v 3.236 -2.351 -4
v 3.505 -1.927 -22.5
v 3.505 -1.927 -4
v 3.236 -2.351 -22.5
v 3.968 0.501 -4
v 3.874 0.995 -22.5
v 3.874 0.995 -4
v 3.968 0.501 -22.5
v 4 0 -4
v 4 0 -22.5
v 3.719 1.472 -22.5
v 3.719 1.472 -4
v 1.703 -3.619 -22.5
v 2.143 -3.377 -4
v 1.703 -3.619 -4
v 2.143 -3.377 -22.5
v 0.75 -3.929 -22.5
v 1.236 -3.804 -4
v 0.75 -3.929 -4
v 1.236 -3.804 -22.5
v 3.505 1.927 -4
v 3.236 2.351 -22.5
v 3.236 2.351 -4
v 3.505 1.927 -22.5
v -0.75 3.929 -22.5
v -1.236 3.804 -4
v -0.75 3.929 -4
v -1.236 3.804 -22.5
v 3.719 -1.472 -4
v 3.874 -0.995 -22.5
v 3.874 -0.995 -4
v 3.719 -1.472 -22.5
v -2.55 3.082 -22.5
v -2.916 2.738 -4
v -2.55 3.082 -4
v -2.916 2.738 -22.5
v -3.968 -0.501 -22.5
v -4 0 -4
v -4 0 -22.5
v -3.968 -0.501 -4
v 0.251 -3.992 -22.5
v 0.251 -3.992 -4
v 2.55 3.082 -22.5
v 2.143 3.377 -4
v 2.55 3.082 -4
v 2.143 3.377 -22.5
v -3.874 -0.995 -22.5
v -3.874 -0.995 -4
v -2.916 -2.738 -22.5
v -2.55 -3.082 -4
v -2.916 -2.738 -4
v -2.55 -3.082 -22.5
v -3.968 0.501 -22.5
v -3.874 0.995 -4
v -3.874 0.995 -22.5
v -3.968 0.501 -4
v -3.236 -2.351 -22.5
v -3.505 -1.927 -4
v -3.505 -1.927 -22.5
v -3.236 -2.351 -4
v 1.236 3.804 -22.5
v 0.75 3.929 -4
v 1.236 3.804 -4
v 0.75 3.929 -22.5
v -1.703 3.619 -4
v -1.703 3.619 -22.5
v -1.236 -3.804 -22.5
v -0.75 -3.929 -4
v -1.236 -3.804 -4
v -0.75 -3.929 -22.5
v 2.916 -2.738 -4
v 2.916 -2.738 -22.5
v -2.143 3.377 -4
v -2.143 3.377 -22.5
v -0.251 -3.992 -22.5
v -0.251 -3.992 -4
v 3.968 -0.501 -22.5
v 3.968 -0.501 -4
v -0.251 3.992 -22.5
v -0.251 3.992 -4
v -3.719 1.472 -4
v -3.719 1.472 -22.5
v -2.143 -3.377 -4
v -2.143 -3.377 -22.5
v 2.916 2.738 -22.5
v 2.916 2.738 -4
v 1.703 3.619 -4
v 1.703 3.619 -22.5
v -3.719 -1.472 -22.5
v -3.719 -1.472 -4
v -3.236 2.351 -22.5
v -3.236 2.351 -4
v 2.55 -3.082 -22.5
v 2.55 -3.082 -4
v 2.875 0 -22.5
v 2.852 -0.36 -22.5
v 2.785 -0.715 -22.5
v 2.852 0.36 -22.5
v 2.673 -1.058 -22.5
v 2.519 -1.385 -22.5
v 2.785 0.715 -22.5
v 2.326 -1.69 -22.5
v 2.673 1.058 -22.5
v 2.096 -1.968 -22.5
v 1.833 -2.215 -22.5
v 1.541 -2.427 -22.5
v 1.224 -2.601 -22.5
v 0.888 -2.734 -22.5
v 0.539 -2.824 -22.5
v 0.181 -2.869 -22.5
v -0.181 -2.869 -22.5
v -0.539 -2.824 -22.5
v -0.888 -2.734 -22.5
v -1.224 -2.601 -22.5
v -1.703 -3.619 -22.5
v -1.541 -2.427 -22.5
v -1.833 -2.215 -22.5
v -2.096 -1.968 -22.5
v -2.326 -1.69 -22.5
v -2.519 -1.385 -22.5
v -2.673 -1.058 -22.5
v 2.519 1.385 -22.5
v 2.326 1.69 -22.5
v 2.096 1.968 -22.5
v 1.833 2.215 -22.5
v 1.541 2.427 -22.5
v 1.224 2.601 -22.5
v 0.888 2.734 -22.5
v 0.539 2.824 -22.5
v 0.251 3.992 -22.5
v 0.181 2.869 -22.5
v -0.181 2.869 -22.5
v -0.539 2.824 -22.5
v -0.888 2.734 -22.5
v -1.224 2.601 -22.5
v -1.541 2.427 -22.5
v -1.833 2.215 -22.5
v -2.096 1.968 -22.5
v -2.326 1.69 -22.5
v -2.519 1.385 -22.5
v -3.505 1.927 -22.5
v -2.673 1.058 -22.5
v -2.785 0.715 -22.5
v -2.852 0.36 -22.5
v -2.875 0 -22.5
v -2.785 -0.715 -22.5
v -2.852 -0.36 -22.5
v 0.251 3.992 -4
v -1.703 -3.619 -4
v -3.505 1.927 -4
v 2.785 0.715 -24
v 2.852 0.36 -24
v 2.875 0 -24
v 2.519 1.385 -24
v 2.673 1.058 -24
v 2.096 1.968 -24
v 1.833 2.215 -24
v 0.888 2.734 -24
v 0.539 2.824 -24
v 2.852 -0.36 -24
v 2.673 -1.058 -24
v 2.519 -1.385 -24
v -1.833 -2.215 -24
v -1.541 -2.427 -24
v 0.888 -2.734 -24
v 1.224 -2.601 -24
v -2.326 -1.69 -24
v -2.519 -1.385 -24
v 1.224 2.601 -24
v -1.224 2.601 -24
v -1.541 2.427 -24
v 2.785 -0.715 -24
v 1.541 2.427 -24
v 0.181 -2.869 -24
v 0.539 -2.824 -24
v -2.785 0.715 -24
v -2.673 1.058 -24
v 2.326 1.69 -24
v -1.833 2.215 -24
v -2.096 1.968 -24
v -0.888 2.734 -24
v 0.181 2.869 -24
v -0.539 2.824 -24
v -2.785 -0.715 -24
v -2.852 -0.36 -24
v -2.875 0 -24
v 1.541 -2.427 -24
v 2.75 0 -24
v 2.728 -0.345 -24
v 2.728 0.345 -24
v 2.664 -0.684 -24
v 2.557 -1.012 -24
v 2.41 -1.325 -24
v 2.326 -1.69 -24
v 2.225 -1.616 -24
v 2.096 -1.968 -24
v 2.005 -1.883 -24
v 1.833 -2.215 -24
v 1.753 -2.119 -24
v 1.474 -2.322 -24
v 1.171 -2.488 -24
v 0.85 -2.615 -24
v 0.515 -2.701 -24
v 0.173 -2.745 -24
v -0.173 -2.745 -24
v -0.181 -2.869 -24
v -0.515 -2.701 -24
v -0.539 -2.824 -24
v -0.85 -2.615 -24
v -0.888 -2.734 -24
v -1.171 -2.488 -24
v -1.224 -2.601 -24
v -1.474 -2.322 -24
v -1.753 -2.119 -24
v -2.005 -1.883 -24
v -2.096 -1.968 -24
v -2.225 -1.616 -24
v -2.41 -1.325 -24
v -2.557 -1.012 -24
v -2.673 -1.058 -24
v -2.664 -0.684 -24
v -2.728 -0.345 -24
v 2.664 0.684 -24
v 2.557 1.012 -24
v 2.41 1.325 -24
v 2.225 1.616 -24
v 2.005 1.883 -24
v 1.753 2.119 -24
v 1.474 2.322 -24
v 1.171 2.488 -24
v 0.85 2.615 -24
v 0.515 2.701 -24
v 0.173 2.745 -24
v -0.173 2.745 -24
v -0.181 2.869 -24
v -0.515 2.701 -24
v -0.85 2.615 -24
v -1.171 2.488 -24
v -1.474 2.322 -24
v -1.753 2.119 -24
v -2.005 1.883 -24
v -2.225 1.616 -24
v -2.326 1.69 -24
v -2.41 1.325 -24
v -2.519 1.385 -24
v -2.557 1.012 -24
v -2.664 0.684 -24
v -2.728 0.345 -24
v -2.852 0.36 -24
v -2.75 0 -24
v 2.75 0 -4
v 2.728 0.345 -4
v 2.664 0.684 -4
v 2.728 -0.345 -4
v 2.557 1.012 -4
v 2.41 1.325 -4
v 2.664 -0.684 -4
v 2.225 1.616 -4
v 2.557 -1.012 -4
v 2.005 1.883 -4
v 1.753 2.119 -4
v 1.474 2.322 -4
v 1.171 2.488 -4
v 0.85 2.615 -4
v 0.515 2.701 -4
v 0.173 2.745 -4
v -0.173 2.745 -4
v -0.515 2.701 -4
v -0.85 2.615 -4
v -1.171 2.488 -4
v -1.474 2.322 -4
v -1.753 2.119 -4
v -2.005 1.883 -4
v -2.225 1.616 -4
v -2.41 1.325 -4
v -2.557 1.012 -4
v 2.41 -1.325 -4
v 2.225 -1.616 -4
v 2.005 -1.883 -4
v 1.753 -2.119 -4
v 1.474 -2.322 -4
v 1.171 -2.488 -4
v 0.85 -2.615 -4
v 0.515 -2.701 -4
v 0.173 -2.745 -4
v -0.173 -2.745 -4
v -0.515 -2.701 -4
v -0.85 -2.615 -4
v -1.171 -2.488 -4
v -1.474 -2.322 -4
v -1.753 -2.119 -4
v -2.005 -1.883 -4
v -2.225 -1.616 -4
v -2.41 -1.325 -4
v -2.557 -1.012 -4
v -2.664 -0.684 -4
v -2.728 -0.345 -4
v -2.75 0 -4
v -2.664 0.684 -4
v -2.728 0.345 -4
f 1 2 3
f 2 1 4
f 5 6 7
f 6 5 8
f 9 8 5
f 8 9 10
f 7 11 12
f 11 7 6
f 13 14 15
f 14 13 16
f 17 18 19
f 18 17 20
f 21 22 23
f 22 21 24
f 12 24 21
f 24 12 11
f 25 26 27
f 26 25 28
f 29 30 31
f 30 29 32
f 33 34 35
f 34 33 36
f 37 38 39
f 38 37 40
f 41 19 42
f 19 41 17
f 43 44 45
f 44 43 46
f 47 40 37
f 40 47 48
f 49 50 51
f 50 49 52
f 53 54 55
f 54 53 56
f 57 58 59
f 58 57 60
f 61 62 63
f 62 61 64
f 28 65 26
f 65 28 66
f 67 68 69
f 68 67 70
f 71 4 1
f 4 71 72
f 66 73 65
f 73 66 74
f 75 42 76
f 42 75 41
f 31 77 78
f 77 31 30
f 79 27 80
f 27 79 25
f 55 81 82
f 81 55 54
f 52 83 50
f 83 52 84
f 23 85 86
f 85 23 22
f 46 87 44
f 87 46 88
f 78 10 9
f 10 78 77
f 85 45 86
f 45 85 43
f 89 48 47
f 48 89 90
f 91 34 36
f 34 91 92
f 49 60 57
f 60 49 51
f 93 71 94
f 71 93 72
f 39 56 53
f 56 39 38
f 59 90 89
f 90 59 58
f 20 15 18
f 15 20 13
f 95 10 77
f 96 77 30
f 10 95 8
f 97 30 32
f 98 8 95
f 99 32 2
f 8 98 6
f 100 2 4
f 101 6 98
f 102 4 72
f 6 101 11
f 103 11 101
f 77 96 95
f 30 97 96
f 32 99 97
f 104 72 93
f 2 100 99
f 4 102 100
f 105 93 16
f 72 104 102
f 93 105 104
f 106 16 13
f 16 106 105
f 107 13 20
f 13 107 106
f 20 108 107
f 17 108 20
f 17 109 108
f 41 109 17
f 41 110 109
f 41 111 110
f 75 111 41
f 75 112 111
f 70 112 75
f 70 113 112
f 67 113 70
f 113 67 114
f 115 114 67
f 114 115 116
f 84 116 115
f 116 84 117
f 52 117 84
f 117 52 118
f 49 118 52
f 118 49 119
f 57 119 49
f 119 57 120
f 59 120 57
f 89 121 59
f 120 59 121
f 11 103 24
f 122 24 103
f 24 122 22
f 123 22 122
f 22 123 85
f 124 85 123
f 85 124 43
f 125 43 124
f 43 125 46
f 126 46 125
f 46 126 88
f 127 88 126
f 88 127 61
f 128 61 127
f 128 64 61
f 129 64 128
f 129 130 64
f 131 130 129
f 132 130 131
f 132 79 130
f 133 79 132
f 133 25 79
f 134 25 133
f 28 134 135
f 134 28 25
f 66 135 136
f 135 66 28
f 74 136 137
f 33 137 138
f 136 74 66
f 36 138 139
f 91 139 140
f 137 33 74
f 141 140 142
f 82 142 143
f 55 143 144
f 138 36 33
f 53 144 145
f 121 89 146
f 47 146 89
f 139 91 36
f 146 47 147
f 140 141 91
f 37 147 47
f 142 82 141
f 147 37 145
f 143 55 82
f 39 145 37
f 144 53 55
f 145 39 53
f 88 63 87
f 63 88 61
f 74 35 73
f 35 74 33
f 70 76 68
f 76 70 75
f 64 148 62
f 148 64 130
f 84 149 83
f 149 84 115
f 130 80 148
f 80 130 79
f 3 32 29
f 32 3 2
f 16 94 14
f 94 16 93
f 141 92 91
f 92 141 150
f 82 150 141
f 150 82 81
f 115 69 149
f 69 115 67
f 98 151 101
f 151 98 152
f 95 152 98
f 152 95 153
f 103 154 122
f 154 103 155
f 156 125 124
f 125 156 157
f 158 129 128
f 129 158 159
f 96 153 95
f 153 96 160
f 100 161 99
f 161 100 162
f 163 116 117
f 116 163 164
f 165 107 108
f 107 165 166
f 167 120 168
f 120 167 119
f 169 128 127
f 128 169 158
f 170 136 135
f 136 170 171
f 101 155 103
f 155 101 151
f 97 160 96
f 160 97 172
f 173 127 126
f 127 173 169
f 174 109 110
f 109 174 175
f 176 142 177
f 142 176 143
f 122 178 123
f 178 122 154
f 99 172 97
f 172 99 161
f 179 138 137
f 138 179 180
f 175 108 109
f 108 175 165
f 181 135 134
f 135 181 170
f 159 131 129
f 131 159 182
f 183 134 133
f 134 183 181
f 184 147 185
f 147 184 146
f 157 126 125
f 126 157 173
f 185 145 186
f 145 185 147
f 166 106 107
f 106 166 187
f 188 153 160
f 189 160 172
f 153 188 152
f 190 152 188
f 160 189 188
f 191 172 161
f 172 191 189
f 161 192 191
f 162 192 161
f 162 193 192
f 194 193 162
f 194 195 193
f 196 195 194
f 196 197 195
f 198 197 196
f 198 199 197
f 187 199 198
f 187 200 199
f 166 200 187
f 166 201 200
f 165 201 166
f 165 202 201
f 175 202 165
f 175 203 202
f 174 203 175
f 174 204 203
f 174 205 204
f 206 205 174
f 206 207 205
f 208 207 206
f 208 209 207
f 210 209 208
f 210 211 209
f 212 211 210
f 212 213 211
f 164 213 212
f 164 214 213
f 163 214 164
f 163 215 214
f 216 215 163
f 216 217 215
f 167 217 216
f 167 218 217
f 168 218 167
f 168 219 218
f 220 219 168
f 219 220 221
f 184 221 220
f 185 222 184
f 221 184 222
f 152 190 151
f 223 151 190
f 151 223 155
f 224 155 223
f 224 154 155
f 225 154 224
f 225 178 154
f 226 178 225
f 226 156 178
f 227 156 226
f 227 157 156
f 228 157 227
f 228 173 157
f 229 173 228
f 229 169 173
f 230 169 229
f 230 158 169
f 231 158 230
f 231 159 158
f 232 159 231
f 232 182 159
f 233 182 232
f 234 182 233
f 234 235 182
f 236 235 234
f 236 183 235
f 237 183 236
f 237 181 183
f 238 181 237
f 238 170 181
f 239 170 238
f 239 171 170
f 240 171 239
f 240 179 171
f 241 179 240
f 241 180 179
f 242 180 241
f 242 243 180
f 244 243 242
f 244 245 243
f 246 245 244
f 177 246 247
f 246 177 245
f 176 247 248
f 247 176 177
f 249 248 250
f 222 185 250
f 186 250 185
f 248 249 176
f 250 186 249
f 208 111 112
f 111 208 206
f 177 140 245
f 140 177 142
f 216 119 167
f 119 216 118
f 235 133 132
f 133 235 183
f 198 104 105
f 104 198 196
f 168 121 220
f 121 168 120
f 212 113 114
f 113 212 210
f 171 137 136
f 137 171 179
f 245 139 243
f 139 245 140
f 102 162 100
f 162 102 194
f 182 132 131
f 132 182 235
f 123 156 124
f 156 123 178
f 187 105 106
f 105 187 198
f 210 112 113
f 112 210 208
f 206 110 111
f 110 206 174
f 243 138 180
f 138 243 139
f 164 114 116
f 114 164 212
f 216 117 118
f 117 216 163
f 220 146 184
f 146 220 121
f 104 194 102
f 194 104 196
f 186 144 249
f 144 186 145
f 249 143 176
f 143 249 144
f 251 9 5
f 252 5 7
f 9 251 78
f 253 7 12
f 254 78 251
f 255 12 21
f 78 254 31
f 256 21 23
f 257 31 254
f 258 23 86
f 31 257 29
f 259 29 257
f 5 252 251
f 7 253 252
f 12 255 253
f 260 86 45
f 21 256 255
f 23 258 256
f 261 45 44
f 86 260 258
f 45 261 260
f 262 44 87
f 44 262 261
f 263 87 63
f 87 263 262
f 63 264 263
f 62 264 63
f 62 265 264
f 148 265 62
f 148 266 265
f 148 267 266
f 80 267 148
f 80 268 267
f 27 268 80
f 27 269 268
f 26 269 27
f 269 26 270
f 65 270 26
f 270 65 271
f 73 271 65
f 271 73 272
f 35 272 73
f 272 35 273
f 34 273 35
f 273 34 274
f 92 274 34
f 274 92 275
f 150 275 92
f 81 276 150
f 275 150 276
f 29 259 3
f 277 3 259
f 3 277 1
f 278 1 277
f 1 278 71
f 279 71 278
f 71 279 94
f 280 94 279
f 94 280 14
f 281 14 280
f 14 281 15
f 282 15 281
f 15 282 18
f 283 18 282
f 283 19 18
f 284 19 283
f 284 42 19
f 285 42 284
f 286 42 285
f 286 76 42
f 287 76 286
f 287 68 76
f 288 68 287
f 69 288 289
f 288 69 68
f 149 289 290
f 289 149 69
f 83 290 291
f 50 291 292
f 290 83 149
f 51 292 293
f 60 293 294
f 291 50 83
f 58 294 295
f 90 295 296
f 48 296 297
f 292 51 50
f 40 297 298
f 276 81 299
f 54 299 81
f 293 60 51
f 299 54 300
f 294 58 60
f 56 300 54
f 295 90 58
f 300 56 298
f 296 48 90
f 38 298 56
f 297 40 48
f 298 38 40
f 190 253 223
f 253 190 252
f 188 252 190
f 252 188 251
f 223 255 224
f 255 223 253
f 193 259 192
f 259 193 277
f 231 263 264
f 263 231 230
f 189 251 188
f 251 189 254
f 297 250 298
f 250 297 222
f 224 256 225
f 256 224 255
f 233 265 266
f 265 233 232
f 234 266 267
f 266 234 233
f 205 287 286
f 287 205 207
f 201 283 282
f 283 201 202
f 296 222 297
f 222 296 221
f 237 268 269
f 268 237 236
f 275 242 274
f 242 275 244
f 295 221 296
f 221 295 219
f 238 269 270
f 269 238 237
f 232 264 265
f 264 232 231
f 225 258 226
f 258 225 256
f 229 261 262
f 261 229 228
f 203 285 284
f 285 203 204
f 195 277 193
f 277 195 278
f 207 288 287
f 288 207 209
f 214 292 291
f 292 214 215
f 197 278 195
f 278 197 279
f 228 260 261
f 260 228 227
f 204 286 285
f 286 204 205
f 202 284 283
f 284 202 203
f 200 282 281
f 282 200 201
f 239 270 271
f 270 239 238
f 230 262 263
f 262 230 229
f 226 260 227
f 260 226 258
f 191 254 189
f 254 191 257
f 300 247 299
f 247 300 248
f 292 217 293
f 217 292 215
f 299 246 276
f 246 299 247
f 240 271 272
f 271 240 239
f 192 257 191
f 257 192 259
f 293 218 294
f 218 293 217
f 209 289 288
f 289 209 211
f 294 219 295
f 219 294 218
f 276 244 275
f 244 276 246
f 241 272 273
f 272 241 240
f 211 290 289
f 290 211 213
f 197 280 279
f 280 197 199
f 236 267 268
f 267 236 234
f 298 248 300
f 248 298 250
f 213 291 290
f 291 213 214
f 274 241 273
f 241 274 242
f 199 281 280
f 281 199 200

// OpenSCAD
$fn = 50;

difference() {
	union() {
		translate(v = [0, 0, -22.5]) {
			cylinder(h = 25.5, r = 4.0);
		}
		#translate(v = [0, 0, -24.0]) {
			cylinder(h = 24, r = 2.875);
		}
	}
	union() {
		translate(v = [0, 0, 0]) {
			rotate(a = [0, 0, 0]) {
				difference() {
					union() {
						translate(v = [0, 0, -4]) {
							linear_extrude(height = 4) {
								polygon(points = [[4.8468, 0.0], [2.4234000000000004, 4.197451927062417], [-2.423399999999999, 4.197451927062417], [-4.8468, 5.935618106107392e-16], [-2.423400000000002, -4.197451927062416], [2.423399999999997, -4.197451927062419]]);
							}
						}
					}
					union();
				}
			}
		}
		#cylinder(h = 3, r = 6.25);
		#translate(v = [0, 0, -100.0]) {
			cylinder(h = 200, r = 2.75);
		}
	}
}
